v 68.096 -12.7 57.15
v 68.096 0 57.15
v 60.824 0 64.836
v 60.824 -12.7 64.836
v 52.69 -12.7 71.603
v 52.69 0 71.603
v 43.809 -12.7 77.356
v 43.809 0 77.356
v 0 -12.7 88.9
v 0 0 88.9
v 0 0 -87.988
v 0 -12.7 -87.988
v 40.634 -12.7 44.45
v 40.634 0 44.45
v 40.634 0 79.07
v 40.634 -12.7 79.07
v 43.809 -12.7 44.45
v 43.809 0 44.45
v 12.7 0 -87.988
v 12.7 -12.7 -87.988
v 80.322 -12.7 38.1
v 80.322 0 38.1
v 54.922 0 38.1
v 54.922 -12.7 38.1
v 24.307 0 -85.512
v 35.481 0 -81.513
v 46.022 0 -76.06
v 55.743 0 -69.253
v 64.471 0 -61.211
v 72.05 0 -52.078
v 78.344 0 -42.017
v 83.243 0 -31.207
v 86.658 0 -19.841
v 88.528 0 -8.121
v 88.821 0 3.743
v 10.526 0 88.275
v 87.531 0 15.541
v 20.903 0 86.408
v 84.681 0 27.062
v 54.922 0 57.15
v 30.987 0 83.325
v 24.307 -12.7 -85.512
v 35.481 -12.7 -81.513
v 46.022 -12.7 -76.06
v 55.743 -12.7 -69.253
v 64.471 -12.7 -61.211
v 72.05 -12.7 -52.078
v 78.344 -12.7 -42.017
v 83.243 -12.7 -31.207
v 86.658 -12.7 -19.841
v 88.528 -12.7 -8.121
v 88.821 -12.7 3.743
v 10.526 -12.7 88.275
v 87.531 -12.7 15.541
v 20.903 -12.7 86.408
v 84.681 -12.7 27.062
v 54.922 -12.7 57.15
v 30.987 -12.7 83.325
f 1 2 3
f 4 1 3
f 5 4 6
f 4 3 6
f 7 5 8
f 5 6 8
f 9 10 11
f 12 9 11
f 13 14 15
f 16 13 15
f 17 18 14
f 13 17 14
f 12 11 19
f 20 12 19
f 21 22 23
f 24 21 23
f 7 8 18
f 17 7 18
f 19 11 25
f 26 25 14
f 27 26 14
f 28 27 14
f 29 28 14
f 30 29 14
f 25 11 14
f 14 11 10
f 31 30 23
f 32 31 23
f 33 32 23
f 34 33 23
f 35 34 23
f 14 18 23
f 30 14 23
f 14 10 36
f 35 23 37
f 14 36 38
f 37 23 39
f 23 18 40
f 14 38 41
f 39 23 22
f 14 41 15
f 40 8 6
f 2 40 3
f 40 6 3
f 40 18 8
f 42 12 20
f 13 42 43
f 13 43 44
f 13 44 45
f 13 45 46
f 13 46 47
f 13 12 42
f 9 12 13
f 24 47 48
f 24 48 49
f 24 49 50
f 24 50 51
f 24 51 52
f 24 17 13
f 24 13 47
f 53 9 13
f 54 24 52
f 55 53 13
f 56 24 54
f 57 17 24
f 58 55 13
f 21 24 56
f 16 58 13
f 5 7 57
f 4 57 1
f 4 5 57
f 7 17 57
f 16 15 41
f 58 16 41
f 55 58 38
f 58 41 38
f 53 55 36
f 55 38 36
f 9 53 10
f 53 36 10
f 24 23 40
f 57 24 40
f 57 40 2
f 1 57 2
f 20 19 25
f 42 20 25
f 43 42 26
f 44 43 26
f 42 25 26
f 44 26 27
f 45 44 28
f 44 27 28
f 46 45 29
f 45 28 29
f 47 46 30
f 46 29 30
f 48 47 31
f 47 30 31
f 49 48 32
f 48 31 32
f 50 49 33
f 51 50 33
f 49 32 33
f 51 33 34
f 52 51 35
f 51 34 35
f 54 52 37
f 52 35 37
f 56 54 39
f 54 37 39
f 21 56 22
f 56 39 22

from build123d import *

# Parameters (mm, degrees)
F1_DEPTH = 12.7


with BuildPart() as f1:
    # F0 (on Front) → F1 (new body)
    with BuildSketch(Plane.XZ):
        with BuildLine():
            ThreePointArc((40.634353, 79.069965), (20.903231, 86.407551), (0, 88.9))
            Line((0, 88.9), (0, -87.988181))
            Line((0, -87.988181), (12.7, -87.988181))
            ThreePointArc((12.7, -87.988181), (78.344263, -42.016501), (80.321853, 38.1))
            Line((80.321853, 38.1), (54.921853, 38.1))
            Line((54.921853, 38.1), (54.921853, 57.15))
            Line((54.921853, 57.15), (68.096164, 57.15))
            ThreePointArc((68.096164, 57.15), (56.857557, 68.340532), (43.809353, 77.355999))
            Line((43.809353, 77.355999), (43.809353, 44.45))
            Line((43.809353, 44.45), (40.634353, 44.45))
            Line((40.634353, 44.45), (40.634353, 79.069965))
        make_face()
    extrude(amount=F1_DEPTH)


solid = f1.part
